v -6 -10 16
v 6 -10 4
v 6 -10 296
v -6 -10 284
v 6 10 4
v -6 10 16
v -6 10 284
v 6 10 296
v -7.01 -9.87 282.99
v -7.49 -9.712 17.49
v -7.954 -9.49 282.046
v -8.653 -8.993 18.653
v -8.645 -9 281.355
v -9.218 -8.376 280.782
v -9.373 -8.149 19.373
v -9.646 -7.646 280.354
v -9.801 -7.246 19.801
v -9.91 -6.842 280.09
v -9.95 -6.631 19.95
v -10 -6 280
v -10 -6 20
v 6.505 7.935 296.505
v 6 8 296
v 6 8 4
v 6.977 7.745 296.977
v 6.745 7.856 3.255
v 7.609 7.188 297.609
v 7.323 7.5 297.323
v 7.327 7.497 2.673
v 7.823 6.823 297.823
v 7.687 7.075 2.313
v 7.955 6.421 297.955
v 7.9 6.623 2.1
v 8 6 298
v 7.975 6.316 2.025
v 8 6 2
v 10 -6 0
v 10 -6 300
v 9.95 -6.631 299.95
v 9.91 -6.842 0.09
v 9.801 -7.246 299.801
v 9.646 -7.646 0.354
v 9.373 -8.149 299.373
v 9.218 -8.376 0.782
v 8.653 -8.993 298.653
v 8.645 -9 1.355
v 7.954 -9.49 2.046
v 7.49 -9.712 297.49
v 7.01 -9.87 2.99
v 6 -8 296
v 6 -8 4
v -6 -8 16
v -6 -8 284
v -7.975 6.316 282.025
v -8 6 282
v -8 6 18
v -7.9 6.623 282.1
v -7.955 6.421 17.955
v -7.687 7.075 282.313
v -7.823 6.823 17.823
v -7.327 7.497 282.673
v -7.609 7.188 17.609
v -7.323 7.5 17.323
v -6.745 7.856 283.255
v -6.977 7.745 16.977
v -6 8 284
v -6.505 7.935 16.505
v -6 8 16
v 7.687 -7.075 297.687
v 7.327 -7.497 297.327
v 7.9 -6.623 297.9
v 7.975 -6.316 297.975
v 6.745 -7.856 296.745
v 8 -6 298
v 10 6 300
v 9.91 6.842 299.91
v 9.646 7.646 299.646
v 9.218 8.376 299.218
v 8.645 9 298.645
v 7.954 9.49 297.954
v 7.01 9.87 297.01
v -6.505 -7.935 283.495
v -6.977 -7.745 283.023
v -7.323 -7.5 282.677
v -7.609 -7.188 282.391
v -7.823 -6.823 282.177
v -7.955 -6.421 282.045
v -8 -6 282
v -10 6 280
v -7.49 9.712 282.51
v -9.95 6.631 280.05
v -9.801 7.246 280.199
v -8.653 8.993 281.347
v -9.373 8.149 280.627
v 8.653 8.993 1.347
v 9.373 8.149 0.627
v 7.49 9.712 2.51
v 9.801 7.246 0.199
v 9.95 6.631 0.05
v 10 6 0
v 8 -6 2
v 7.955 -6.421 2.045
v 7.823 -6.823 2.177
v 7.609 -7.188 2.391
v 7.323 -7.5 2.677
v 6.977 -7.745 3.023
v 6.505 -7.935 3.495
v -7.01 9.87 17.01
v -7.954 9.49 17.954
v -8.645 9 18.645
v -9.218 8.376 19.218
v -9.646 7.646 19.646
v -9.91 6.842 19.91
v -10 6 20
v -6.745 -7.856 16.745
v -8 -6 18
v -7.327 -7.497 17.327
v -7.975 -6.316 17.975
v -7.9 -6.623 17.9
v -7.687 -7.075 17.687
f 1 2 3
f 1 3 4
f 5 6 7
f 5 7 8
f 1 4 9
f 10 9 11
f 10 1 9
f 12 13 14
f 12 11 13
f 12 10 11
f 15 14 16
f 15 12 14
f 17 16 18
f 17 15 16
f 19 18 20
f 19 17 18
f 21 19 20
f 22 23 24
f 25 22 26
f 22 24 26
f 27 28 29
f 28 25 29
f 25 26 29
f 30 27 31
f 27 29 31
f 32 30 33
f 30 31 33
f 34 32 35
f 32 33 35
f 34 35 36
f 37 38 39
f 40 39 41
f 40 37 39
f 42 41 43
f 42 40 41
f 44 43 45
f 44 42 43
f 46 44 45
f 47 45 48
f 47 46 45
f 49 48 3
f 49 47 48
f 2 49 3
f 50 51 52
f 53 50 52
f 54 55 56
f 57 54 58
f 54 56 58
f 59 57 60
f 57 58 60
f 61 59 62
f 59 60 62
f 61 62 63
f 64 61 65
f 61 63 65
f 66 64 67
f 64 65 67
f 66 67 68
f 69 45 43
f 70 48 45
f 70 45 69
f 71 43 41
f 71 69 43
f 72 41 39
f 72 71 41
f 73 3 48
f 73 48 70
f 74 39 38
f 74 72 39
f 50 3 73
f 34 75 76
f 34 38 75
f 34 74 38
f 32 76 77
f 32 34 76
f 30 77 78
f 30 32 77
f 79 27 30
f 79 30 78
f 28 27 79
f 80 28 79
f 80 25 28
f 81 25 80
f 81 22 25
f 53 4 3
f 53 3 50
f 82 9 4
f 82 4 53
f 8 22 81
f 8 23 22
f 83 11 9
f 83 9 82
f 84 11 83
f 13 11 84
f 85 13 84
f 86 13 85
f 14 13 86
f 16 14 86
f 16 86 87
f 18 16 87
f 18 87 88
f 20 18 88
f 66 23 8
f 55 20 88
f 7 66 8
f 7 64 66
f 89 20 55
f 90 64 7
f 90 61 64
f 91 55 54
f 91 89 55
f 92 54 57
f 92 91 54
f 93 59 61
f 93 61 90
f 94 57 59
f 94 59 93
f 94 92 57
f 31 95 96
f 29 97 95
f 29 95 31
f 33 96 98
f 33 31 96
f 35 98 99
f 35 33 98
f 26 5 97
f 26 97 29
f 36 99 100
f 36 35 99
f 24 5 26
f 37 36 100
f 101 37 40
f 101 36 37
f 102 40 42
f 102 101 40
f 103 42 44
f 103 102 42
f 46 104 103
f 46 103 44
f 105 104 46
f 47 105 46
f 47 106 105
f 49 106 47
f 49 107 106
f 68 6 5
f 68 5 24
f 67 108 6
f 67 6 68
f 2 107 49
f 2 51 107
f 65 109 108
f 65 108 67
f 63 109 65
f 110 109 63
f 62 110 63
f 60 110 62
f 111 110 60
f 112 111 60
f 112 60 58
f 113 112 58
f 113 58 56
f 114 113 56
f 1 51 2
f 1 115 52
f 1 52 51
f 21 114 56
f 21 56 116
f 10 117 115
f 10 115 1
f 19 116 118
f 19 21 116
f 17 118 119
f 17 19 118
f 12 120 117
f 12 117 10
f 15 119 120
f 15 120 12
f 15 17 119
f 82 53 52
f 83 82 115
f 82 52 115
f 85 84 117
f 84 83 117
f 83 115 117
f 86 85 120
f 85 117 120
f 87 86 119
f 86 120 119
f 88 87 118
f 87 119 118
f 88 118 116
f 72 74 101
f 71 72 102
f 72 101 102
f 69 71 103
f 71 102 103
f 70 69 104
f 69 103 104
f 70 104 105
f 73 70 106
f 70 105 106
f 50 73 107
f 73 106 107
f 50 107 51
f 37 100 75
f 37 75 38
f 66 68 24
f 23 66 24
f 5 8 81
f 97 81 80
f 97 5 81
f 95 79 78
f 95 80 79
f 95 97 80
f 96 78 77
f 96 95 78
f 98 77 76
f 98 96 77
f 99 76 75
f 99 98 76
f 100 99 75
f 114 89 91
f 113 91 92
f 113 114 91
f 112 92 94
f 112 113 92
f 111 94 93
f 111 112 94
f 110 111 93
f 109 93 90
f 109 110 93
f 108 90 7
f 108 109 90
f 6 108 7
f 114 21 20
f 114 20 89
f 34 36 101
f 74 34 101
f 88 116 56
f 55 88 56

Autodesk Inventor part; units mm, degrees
ref_plane "Start plane" through (0, 0, 0) normal (0, 0, 1) x (1, 0, 0)
ref_plane "End plane" through (0, 0, 300) normal (0, 0, 1) x (1, 0, 0)
sketch "Sketch" plane through (0, 0, 0) normal (0, 0, 1) x (1, 0, 0)
  line L0 (-10, -6) -> (-10, 6)
  line L1 (-6, 10) -> (6, 10)
  line L2 (10, 6) -> (10, -6)
  line L3 (6, -10) -> (-6, -10)
  arc A0 (-10, -6) -> (-6, -10) centre (-6, -6) ccw
  arc A1 (10, 6) -> (6, 10) centre (6, 6) ccw
  arc A2 (-6, 10) -> (-10, 6) centre (-6, 6) ccw
  arc A3 (6, -10) -> (10, -6) centre (6, -6) ccw
  arc A4 (-6, 8) -> (-8, 6) centre (-6, 6) ccw
  line L4 (-6, 8) -> (6, 8)
  arc A5 (8, 6) -> (6, 8) centre (6, 6) ccw
  line L5 (8, 6) -> (8, -6)
  arc A6 (6, -8) -> (8, -6) centre (6, -6) ccw
  line L6 (6, -8) -> (-6, -8)
  arc A7 (-8, -6) -> (-6, -8) centre (-6, -6) ccw
  line L7 (-8, -6) -> (-8, 6)
  line L8 (0, 15.1598) -> (0, -15.1598) construction
  line L9 (-15.1598, 0) -> (15.1598, 0) construction
  dimension "d7" = 4
  dimension "d9" = 20
  dimension "d11" = 20
  dimension "d12" = 2
  dimension "d15" = 10
  dimension "d16" = 10
extrude "Body" add sketch "Sketch" along normal up to surface (300 mm away) from surface at 0
sketch "Sketch3" plane through (0, 0, 0) normal (0, 0, 1) x (1, 0, 0)
  line L0 (0, 0) -> (10, 0)
ref_plane "Work Plane3" through (0, 0, 0) normal (0, -1, 0) x (1, 0, 0)
sketch "Sketch4" plane through (0, 0, 0) normal (0, -1, 0) x (1, 0, 0)
  line L0 (-2, 0) -> (12, 0)
  line L1 (-2, 300) -> (12, 300)
  dimension "d18" = 300
ref_plane "Work Plane4" through (10, 0, 0) normal (-0.7071, 0, -0.7071) x (-0.7071, 0, 0.7071)
split "Split1" plane through (10, 0, 0) removes the side toward (-0.7071, 0, -0.7071)
ref_plane "Work Plane5" through (10, 0, 300) normal (-0.7071, 0, 0.7071) x (0.7071, 0, 0.7071)
split "Split2" plane through (10, 0, 300) removes the side toward (-0.7071, 0, 0.7071)
equation "\"d7\" = G_IR"
equation "\"d9\" = G_W"
equation "\"d11\" = G_H"
equation "\"d12\" = G_T"
equation "\"d15\" = 0.5 * d9"
equation "\"d16\" = 0.5 * d11"
equation "\"d3\" = G_L"
equation "\"G_W\" = 20"
equation "\"G_H\" = 20"
equation "\"G_T\" = 2"
equation "\"G_IR\" = 4"
equation "\"G_L\" = d18"
equation "\"G_OFFSET_START\" = 0"
equation "\"G_OFFSET_END\" = 0"
properties part number "ISO 4019 - 20x20x2 - 300" material "Steel, Mild"
